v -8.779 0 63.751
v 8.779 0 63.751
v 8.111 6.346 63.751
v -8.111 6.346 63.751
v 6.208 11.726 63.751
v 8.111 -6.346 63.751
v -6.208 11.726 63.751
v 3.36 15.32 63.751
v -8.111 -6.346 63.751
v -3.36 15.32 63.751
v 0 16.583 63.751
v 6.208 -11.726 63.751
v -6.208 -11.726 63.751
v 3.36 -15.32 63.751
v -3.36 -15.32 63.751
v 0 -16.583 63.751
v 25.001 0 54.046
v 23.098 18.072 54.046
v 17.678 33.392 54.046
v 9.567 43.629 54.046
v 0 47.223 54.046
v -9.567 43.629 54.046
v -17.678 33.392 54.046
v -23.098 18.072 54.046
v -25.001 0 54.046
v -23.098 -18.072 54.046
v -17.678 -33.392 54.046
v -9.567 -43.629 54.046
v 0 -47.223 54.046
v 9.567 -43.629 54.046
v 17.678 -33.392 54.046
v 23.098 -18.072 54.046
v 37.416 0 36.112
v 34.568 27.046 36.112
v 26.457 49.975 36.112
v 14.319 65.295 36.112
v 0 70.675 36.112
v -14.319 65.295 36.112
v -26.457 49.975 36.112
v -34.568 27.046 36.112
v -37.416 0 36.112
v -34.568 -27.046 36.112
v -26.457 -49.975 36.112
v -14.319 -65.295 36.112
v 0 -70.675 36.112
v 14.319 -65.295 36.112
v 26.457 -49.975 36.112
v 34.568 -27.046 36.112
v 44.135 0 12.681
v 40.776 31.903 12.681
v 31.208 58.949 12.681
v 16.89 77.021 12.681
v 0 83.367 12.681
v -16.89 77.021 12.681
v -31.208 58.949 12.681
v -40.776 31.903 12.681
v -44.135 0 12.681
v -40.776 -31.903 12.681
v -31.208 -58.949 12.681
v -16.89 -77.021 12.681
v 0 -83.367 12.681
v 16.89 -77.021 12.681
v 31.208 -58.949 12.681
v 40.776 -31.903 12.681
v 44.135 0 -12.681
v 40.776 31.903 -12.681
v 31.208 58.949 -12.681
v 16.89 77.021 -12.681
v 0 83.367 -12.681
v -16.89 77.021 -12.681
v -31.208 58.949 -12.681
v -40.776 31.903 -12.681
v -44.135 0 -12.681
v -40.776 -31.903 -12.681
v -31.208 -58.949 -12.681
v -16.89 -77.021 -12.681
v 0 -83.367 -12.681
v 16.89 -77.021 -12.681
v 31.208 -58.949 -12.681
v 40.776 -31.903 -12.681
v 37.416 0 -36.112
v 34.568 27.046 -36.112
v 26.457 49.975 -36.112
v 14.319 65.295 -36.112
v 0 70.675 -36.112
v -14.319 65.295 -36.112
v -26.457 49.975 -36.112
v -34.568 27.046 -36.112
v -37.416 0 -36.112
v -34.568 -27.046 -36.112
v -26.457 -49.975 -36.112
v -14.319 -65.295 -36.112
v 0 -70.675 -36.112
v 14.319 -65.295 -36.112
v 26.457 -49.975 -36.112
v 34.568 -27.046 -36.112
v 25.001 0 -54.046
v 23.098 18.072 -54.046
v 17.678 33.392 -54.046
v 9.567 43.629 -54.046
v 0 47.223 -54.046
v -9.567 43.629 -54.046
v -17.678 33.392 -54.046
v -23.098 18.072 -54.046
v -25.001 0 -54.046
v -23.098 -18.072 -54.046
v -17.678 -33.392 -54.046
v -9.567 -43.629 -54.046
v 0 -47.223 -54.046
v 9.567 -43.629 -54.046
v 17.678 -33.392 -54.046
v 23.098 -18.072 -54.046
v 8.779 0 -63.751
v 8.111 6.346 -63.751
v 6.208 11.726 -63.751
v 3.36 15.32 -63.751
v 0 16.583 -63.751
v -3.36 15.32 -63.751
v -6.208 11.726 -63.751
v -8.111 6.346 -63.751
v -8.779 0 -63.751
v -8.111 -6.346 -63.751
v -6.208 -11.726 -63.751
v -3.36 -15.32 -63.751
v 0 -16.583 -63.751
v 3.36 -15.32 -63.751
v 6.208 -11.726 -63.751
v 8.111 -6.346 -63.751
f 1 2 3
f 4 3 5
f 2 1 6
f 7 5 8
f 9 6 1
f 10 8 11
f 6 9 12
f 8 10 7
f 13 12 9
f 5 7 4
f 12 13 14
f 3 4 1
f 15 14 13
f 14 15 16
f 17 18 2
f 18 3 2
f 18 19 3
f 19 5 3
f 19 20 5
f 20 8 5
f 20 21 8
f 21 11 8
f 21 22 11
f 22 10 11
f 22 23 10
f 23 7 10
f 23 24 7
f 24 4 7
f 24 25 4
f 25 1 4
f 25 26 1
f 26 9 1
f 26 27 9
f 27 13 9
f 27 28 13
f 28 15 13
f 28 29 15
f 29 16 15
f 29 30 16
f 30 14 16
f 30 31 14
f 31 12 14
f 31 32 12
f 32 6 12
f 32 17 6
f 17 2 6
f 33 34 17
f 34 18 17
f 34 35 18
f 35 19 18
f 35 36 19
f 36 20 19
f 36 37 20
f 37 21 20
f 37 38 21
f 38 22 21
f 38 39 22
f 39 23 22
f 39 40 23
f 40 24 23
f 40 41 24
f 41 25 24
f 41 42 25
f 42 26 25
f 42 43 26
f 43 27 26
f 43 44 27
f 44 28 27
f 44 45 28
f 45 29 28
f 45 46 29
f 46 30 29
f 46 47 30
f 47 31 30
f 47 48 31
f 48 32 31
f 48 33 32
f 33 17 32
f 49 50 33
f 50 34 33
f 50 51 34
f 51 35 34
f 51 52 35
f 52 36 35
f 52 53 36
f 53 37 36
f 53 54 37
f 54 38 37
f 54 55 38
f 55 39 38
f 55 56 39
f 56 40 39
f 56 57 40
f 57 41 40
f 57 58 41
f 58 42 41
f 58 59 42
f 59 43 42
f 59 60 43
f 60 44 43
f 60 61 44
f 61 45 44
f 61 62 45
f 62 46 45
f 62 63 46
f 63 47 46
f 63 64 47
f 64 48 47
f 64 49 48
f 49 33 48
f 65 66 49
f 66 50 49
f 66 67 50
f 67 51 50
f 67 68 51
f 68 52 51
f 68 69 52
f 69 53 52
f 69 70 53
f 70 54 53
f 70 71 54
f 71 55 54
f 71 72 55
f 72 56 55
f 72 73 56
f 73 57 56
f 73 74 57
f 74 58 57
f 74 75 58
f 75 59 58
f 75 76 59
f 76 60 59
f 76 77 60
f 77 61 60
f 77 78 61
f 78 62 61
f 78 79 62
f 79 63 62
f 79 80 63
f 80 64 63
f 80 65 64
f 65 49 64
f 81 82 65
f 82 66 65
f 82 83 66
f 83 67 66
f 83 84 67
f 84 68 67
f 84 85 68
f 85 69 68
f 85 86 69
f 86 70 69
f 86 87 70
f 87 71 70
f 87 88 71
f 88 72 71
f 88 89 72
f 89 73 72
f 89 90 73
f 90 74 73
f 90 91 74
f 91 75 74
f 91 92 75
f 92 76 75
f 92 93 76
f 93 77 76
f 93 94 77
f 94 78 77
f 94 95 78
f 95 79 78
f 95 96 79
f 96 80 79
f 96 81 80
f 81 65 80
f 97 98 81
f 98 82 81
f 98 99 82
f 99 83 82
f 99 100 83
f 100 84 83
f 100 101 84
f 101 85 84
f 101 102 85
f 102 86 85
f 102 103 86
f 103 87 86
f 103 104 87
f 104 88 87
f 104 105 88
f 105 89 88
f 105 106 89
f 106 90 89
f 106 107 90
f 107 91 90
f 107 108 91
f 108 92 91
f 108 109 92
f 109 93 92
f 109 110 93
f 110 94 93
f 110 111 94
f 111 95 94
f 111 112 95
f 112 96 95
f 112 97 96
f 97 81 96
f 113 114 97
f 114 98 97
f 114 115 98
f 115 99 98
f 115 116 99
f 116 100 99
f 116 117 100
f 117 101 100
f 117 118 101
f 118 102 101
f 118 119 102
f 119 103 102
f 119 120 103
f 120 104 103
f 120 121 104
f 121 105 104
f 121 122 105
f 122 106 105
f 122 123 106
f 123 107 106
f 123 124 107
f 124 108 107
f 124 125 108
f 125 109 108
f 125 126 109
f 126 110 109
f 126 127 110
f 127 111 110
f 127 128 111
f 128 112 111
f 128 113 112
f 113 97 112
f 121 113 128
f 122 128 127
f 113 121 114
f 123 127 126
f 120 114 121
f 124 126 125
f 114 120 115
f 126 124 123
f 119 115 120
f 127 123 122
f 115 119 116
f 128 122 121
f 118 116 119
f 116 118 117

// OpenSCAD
// Generated by SolidPython 1.0.1 on 2020-07-29 00:46:49


scale(v = [9, 17, 13]) {
	sphere(r = 5);
}
/***********************************************
*********      SolidPython code:      **********
************************************************
 
# import packages: SolidPython
from solid import *
from solid.utils import *
from itertools import chain, combinations, permutations


class Resize:

    def __init__(self, scad_file):
        self.scad_file = scad_file
        #self.scad_file = import_scad(scad_file)
        # cone/cylinder param:
        self.r1 = 0
        self.r2 = 0
        self.h = 0
        # rectangular prism param:
        self.w = 0
        self.l = 0
        # ellipse param:
        self.r = 0

    # import OpenScad code (file name corresponds to shape)


    # classify shape + parameters
    def assign(self, param1, param2, param3):
        if self.scad_file == 'cone.scad':
            self.r1 = param1
            self.r2 = param2
            self.h = param3
        elif self.scad_file == 'cylinder.scad':
            self.r1 = param1
            self.r2 = param2
            self.h = param3
        elif self.scad_file == 'rectangularPrism.scad':
            self.h = param1
            self.l = param2
            self.w = param3
        else:
            self.r = param1
            self.h = param2

    # resize parameters
    def iterate(self):
        x = range(3, 20, 2)
        i = 1
        if self.scad_file == 'cone.scad':
            tempList = list(permutations(x, 2))
            for temp in tempList:
                param1 = temp[0]
                param2 = temp[1]
                filepath = 'produced_scad_files/' + 'cone' + str(param1) + '_' + str(param2) + '_' + '.scad'
                scad_render_to_file(cylinder(h=param1, r1=param2, r2=0), filepath)

        elif self.scad_file == 'cylinder.scad':
            tempList = list(permutations(x, 3))
            for temp in tempList:
                param1 = temp[0]
                param2 = temp[1]
                filepath = 'produced_scad_files/' + 'cylinder' + str(param1) + '_' + str(param2) + '_' + '.scad'
                scad_render_to_file(cylinder(h=param1, r1=param2, r2=param2), filepath)

        elif self.scad_file == 'rectangularPrism.scad':
            tempList = list(permutations(x, 3))
            for temp in tempList:
                param1 = temp[0]
                param2 = temp[1]
                param3 = temp[2]
                filepath = 'produced_scad_files/' + 'rectangularPrism' + str(param1) + '_' + str(param2) + '_' + str(
                    param3) + '.scad'
                scad_render_to_file(cube(size=(param1, param2, param3)), filepath)

        elif self.scad_file == 'ellipse.scad':
            tempList = list(permutations(x, 4))
            for temp in tempList:
                param1 = temp[0]
                param2 = temp[1]
                param3 = temp[2]
                param4 = temp[3]
                filepath = 'produced_scad_files/' + 'ellipse' + str(param1) + '_' + str(param2) + '_' + str(param3) + '_' + str(param4) + '.scad'
                scad_render_to_file(scale([param1, param2, param3])(sphere(r=param4)), filepath)

    def render_to_scadfile(self):
        scad_render_to_file(scad, 'example.scad') 
 
************************************************/
